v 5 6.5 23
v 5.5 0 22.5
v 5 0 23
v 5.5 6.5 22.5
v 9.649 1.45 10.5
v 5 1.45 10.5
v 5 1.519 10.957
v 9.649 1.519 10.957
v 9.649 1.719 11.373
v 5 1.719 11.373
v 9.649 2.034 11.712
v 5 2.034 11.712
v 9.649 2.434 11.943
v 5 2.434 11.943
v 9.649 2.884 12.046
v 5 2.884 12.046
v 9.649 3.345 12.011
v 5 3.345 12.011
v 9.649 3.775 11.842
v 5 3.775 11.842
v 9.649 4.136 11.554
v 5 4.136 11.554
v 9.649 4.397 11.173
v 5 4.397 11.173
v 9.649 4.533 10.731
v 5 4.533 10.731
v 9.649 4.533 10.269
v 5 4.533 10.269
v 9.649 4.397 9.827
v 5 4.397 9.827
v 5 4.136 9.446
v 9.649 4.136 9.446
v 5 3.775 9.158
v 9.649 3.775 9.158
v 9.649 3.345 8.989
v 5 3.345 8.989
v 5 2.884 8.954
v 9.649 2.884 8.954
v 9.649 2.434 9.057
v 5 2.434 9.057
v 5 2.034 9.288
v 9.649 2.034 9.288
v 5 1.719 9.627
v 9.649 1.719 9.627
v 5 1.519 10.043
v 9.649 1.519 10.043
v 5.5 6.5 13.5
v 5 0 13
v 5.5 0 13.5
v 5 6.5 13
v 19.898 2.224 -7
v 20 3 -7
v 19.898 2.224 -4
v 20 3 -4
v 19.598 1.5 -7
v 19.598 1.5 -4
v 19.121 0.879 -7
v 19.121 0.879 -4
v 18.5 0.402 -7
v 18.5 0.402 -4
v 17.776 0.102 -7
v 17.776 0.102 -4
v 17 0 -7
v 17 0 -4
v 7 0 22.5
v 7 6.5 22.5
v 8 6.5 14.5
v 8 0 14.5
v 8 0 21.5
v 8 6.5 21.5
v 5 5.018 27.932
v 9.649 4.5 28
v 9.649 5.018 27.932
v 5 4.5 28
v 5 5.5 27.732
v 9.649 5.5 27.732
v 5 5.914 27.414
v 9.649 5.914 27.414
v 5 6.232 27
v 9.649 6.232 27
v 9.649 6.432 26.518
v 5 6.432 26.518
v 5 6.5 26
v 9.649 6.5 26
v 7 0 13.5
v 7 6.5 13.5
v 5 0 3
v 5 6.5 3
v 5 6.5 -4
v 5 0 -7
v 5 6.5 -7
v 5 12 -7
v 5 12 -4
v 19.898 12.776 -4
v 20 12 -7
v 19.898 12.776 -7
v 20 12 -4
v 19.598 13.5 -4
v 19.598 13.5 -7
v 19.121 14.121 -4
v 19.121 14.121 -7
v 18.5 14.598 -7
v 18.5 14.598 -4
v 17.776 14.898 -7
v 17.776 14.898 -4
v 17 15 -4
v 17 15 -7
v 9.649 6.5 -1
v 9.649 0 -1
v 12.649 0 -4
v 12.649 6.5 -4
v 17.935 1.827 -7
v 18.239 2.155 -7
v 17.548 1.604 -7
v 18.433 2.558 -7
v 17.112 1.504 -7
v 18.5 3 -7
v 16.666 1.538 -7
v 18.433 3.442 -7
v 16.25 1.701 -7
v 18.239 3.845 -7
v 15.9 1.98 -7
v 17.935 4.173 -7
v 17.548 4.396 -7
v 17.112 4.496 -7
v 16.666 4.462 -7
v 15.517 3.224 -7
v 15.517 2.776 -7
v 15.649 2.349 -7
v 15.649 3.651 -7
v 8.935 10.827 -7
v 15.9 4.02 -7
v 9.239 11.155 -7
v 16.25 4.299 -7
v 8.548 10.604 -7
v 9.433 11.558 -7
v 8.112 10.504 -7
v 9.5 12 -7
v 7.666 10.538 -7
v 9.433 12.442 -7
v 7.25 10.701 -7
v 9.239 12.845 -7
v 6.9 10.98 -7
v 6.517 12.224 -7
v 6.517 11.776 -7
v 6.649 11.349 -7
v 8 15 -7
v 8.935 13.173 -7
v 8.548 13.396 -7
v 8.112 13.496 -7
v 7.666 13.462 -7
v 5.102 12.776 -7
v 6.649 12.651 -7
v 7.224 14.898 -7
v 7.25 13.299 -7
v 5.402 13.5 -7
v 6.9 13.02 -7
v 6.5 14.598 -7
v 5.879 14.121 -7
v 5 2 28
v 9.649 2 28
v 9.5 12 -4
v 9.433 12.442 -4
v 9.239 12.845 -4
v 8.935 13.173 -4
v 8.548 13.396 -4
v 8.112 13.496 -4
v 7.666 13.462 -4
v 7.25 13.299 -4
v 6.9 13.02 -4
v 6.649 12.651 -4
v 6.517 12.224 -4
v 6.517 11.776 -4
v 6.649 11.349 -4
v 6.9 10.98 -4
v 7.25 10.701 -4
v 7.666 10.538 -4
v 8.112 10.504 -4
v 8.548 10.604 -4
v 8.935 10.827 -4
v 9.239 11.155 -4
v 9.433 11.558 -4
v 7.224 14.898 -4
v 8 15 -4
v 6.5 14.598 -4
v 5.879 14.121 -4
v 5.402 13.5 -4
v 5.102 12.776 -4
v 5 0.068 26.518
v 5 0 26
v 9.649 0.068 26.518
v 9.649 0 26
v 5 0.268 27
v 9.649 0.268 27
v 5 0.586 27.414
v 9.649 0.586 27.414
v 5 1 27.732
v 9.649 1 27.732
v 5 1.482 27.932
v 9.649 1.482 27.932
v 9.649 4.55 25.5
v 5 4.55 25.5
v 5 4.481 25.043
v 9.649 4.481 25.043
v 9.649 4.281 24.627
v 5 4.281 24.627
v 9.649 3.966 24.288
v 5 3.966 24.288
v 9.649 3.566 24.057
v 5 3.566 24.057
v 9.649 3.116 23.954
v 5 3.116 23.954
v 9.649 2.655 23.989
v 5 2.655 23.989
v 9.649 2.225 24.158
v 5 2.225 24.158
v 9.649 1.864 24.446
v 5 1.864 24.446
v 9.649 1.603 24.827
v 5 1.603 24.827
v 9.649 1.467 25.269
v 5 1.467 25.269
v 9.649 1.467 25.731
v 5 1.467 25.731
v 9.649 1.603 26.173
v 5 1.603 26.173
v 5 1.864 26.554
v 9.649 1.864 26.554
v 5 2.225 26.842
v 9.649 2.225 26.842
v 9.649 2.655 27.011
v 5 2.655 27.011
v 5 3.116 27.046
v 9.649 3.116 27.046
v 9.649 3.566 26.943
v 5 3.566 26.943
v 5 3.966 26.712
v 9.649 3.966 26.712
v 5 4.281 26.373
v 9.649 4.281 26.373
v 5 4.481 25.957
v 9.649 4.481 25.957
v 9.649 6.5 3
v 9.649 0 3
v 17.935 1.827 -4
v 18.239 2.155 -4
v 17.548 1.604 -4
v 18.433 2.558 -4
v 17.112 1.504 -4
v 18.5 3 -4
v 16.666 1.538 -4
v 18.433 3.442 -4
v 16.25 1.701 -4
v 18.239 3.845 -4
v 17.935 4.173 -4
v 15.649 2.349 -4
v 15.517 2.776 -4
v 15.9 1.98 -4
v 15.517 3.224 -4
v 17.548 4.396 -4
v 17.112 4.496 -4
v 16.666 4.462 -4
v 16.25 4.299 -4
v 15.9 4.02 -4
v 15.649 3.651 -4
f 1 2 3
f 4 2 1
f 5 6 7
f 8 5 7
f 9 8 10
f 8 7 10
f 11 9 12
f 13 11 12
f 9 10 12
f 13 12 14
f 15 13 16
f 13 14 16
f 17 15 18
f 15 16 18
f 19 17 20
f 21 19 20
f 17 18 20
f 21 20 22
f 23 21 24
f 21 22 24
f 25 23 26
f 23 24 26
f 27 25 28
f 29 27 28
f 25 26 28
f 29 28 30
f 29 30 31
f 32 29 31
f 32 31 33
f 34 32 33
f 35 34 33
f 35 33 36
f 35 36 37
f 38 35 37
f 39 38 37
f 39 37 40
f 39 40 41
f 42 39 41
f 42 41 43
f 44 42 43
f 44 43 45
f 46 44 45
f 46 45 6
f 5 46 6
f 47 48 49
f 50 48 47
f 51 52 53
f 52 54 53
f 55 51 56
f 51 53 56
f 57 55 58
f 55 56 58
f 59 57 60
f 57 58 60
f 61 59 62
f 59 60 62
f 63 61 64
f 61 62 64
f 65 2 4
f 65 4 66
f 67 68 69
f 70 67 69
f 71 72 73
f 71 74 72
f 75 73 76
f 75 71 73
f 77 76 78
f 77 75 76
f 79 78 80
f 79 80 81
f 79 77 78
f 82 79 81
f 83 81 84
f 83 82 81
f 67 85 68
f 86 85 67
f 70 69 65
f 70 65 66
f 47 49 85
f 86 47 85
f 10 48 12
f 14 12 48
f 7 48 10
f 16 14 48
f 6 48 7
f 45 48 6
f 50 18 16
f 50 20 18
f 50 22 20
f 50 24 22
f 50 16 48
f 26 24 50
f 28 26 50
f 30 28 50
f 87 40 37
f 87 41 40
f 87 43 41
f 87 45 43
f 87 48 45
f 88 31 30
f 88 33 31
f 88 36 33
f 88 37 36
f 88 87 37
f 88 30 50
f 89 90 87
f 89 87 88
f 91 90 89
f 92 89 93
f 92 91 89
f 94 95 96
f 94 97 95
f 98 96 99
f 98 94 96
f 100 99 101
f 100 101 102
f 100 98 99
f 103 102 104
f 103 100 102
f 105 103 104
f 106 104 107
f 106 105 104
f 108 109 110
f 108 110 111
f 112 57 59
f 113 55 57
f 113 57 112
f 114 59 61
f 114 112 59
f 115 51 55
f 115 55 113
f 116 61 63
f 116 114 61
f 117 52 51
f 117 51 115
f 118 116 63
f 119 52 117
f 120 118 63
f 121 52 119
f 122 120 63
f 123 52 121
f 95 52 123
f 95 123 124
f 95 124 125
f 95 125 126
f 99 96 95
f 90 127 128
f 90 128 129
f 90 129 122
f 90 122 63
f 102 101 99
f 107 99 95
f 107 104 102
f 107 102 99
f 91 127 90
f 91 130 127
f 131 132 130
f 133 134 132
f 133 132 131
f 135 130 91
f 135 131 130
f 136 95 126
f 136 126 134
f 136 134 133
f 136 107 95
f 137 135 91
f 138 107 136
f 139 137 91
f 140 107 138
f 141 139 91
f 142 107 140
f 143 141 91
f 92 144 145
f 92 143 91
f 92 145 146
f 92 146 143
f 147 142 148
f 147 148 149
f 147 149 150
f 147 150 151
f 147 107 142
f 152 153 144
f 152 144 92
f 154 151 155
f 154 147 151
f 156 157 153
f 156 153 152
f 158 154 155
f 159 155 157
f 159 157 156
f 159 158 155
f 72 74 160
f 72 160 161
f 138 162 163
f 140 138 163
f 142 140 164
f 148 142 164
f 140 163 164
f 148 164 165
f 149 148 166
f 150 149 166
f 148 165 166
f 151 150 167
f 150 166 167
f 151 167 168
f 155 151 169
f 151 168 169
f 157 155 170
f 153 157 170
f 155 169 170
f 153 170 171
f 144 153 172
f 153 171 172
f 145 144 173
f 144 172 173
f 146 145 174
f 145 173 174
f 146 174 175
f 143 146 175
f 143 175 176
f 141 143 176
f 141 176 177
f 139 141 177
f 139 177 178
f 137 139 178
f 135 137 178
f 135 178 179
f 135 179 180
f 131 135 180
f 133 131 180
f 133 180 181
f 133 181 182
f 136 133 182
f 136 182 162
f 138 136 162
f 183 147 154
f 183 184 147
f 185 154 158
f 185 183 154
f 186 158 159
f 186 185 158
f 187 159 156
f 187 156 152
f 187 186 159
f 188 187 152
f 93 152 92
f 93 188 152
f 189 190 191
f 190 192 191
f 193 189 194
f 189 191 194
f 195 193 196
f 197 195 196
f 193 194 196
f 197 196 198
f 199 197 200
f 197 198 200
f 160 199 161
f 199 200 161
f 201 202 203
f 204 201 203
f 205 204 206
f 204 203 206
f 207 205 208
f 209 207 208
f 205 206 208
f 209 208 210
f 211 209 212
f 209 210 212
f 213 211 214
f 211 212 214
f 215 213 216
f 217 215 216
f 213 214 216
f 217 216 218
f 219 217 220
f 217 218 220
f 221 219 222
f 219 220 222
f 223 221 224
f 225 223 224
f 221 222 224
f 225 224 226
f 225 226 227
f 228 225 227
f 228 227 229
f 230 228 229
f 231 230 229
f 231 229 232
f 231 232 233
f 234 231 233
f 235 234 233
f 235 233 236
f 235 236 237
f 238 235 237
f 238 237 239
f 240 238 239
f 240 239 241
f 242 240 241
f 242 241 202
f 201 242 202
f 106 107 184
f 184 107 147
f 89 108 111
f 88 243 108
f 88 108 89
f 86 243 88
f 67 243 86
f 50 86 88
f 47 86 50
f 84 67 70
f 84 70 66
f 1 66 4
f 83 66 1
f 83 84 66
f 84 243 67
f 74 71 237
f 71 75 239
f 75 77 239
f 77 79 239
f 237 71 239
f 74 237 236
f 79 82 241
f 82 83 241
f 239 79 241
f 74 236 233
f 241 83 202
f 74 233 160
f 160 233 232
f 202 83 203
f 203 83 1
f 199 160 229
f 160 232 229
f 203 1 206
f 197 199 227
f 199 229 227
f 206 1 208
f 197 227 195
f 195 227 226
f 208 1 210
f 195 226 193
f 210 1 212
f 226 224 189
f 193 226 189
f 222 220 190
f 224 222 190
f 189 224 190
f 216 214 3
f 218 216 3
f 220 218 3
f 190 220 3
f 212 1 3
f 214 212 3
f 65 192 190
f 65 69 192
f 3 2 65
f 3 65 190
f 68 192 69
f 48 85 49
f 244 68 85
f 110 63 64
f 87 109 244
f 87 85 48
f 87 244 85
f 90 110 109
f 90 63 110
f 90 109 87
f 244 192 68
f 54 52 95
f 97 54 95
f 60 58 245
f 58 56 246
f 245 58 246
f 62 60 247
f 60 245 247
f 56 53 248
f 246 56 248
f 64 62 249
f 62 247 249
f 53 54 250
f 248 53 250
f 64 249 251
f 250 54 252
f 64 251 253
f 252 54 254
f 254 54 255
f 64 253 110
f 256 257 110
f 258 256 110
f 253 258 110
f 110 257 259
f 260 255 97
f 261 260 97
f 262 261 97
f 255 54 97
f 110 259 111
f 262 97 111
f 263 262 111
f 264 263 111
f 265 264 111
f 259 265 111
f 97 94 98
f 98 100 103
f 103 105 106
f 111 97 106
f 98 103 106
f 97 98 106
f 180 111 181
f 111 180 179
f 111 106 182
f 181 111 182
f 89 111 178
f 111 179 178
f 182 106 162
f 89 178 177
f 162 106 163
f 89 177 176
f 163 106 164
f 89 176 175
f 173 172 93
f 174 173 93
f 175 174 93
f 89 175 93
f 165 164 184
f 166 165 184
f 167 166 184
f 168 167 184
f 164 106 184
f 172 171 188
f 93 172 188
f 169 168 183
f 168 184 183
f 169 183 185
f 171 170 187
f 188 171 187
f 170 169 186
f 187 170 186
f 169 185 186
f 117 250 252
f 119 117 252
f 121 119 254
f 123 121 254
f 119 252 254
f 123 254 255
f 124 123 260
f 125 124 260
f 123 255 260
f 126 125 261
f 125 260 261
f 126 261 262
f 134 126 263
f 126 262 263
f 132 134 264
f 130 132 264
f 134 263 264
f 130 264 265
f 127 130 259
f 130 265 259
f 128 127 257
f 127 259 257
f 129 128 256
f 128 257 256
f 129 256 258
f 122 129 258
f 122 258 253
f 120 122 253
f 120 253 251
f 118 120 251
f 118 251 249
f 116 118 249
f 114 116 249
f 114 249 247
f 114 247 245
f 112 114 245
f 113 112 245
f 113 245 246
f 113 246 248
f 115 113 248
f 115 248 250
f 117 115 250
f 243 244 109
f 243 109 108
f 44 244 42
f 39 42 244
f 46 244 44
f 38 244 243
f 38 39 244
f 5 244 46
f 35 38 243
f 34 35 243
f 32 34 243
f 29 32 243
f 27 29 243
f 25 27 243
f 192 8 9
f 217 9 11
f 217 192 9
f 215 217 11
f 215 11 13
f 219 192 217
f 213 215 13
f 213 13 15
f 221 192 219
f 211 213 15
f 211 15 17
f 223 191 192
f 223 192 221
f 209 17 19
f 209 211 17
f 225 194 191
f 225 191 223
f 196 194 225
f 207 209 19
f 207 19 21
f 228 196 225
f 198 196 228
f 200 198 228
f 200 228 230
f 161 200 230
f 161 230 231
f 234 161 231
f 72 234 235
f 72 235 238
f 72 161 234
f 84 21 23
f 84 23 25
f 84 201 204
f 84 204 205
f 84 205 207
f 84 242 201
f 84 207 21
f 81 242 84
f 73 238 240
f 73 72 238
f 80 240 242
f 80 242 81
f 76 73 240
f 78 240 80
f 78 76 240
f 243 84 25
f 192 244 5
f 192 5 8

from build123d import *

# Parameters (mm, degrees)
SKETCH1_W           = 28
SKETCH1_H           = 5
BOSS_EXTRUDE1_DEPTH = 20
CHAMFER1_SIZE       = 15
BOSS_EXTRUDE2_DEPTH = 28
SKETCH3_W           = 3
SKETCH3_H           = 9
CUT_EXTRUDE1_DEPTH  = 12.8
CHAMFER2_SIZE       = 1
FILLET1_R           = 2
CHAMFER3_SIZE       = 0.5
CUT_EXTRUDE2_DEPTH  = 12.8
CHAMFER4_SIZE       = 3
CHAMFER5_SIZE       = 3
SKETCH8_W           = 3.20799886
SKETCH8_H           = 3.210000155
SKETCH8_W_2         = 3.209995615
SKETCH8_H_2         = 3.268000248
CUT_EXTRUDE3_DEPTH  = 5.4
SKETCH9_W           = 136.063633216
SKETCH9_H           = 34.178471192
CUT_EXTRUDE4_DEPTH  = 8
SKETCH10_W          = 4.648757297
SKETCH10_H          = 6.5
BOSS_EXTRUDE3_DEPTH = 10
SKETCH12_W          = 15
SKETCH12_H          = 15
BOSS_EXTRUDE4_DEPTH = 3
SKETCH13_R          = 1.5
CUT_EXTRUDE5_DEPTH  = 5
FILLET2_R           = 3
CHAMFER6_SIZE       = 3


with BuildPart() as part:
    # Sketch1 → Boss-Extrude1 (new body)
    with BuildSketch(Plane(origin=(0, 0, 0), x_dir=(1, 0, 0), z_dir=(0, 1, 0))):
        with Locations((14, 2.5)):
            Rectangle(SKETCH1_W, SKETCH1_H)
    extrude(amount=BOSS_EXTRUDE1_DEPTH)

    # Chamfer1
    chamfer1_edges = [part.edges().sort_by_distance(p)[0] for p in [
        (28, 0, -2.5),
    ]]
    chamfer(chamfer1_edges, length=CHAMFER1_SIZE)

    # Sketch2 → Boss-Extrude2 (add)
    with BuildSketch(Plane.XY):
        Polygon((9.648757297, 6.5), (5, 6.5), (5, 2), (5, 0), (9.648757297, 0), align=None)
    extrude(amount=BOSS_EXTRUDE2_DEPTH)

    # Sketch3 → Cut-Extrude1 (cut)
    with BuildSketch(Plane.XZ):
        with Locations((6.5, 18)):
            Rectangle(SKETCH3_W, SKETCH3_H)
    extrude(amount=-CUT_EXTRUDE1_DEPTH, mode=Mode.SUBTRACT)

    # Chamfer2
    chamfer2_edges = [part.edges().sort_by_distance(p)[0] for p in [
        (8, 3.25, 22.5),
        (8, 3.25, 13.5),
    ]]
    chamfer(chamfer2_edges, length=CHAMFER2_SIZE)

    # Fillet1
    fillet1_edges = [part.edges().sort_by_distance(p)[0] for p in [
        (7.324378649, 6.5, 28),
        (7.324378649, 0, 28),
    ]]
    fillet(fillet1_edges, radius=FILLET1_R)

    # Chamfer3
    chamfer3_edges = [part.edges().sort_by_distance(p)[0] for p in [
        (5, 3.25, 13.5),
        (5, 3.25, 22.5),
    ]]
    chamfer(chamfer3_edges, length=CHAMFER3_SIZE)

    # Sketch4 → Cut-Extrude2 (cut)
    with BuildSketch(Plane.ZY.offset(-5)):
        with BuildLine():
            ThreePointArc((25.5, 1.45), (27.05, 3), (25.5, 4.55))
            ThreePointArc((25.5, 4.55), (23.95, 3), (25.5, 1.45))
        make_face()
        with BuildLine():
            ThreePointArc((10.5, 4.55), (8.95, 3), (10.5, 1.45))
            ThreePointArc((10.5, 1.45), (12.05, 3), (10.5, 4.55))
        make_face()
    extrude(amount=-CUT_EXTRUDE2_DEPTH, mode=Mode.SUBTRACT)

    # Chamfer4
    chamfer4_edges = [part.edges().sort_by_distance(p)[0] for p in [
        (5, 3.25, 0),
        (9.648757297, 3.25, 0),
    ]]
    chamfer(chamfer4_edges, length=CHAMFER4_SIZE)

    # Chamfer5
    chamfer5_edges = [part.edges().sort_by_distance(p)[0] for p in [
        (7.324378649, 6.5, 0),
    ]]
    chamfer(chamfer5_edges, length=CHAMFER5_SIZE)

    # Sketch8 → Cut-Extrude3 (cut)
    # profile 1 of 4: a face of its own
    with BuildSketch(Plane(origin=(0, 20, 0), x_dir=(1, 0, 0), z_dir=(0, 1, 0))):
        with Locations((5.668003112, 2.226999903)):
            Rectangle(SKETCH8_W, SKETCH8_H)
        Polygon((7.122002542, 3.68199998), (6.328001618, 3.68199998), (4.214003682, 3.68199998), (4.214003682, 2.801999915), (4.214003682, 2.091999864), (4.214003682, 0.771999825), (4.858002067, 0.771999825), (6.60200417, 0.771999825), (7.122002542, 0.771999825), (7.122002542, 3.48399987), align=None, mode=Mode.SUBTRACT)
    # profile 2 of 4: a face of its own
    with BuildSketch(Plane(origin=(0, 20, 0), x_dir=(1, 0, 0), z_dir=(0, 1, 0))):
        Polygon((7.122002542, 3.68199998), (7.122002542, 3.48399987), (7.122002542, 0.771999825), (6.60200417, 0.771999825), (4.858002067, 0.771999825), (4.214003682, 0.771999825), (4.214003682, 2.091999864), (4.214003682, 2.801999915), (4.214003682, 3.68199998), (6.328001618, 3.68199998), align=None)
    # profile 3 of 4: a face of its own
    with BuildSketch(Plane(origin=(0, 20, 0), x_dir=(1, 0, 0), z_dir=(0, 1, 0))):
        with Locations((23.709002883, 2.229999751)):
            Rectangle(SKETCH8_W_2, SKETCH8_H_2)
        Polygon((22.254005075, 1.15799997), (22.254005075, 1.283999765), (22.254005075, 3.713999875), (25.16400069, 3.713999875), (25.16400069, 0.749999657), (25.16400069, 0.745999627), (24.429999292, 0.745999627), (22.254005075, 0.745999627), align=None, mode=Mode.SUBTRACT)
    # profile 4 of 4: a face of its own
    with BuildSketch(Plane(origin=(0, 20, 0), x_dir=(1, 0, 0), z_dir=(0, 1, 0))):
        Polygon((22.254005075, 3.713999875), (22.254005075, 1.283999765), (22.254005075, 1.15799997), (22.254005075, 0.745999627), (24.429999292, 0.745999627), (25.16400069, 0.745999627), (25.16400069, 0.749999657), (25.16400069, 3.713999875), align=None)
    extrude(amount=-CUT_EXTRUDE3_DEPTH, mode=Mode.SUBTRACT)

    # Sketch9 → Cut-Extrude4 (cut)
    with BuildSketch(Plane(origin=(0, 0, -5), x_dir=(-1, 0, 0), z_dir=(0, 0, -1))):
        with Locations((-4.69867378, 12.292617934)):
            Rectangle(SKETCH9_W, SKETCH9_H)
    extrude(amount=-CUT_EXTRUDE4_DEPTH, mode=Mode.SUBTRACT)

    # Sketch10 → Boss-Extrude3 (add)
    with BuildSketch(Plane(origin=(0, 0, 3), x_dir=(-1, 0, 0), z_dir=(0, 0, -1))):
        with Locations((-7.324378649, 3.25)):
            Rectangle(SKETCH10_W, SKETCH10_H)
    extrude(amount=BOSS_EXTRUDE3_DEPTH)

    # Sketch12 → Boss-Extrude4 (add)
    with BuildSketch(Plane(origin=(0, 0, -7), x_dir=(-1, 0, 0), z_dir=(0, 0, -1))):
        with Locations((-12.5, 7.5)):
            Rectangle(SKETCH12_W, SKETCH12_H)
    extrude(amount=-BOSS_EXTRUDE4_DEPTH)

    # Sketch13 → Cut-Extrude5 (cut)
    with BuildSketch(Plane.XY.offset(-4)):
        with Locations((17, 3)):
            Circle(SKETCH13_R)
        with Locations((8, 12)):
            Circle(SKETCH13_R)
    extrude(amount=-CUT_EXTRUDE5_DEPTH, mode=Mode.SUBTRACT)

    # Fillet2
    fillet2_edges = [part.edges().sort_by_distance(p)[0] for p in [
        (5, 15, -5.5),
        (20, 0, -5.5),
        (20, 15, -5.5),
    ]]
    fillet(fillet2_edges, radius=FILLET2_R)

    # Chamfer6
    chamfer6_edges = [part.edges().sort_by_distance(p)[0] for p in [
        (9.648757297, 3.25, -4),
    ]]
    chamfer(chamfer6_edges, length=CHAMFER6_SIZE)


solid = part.part
